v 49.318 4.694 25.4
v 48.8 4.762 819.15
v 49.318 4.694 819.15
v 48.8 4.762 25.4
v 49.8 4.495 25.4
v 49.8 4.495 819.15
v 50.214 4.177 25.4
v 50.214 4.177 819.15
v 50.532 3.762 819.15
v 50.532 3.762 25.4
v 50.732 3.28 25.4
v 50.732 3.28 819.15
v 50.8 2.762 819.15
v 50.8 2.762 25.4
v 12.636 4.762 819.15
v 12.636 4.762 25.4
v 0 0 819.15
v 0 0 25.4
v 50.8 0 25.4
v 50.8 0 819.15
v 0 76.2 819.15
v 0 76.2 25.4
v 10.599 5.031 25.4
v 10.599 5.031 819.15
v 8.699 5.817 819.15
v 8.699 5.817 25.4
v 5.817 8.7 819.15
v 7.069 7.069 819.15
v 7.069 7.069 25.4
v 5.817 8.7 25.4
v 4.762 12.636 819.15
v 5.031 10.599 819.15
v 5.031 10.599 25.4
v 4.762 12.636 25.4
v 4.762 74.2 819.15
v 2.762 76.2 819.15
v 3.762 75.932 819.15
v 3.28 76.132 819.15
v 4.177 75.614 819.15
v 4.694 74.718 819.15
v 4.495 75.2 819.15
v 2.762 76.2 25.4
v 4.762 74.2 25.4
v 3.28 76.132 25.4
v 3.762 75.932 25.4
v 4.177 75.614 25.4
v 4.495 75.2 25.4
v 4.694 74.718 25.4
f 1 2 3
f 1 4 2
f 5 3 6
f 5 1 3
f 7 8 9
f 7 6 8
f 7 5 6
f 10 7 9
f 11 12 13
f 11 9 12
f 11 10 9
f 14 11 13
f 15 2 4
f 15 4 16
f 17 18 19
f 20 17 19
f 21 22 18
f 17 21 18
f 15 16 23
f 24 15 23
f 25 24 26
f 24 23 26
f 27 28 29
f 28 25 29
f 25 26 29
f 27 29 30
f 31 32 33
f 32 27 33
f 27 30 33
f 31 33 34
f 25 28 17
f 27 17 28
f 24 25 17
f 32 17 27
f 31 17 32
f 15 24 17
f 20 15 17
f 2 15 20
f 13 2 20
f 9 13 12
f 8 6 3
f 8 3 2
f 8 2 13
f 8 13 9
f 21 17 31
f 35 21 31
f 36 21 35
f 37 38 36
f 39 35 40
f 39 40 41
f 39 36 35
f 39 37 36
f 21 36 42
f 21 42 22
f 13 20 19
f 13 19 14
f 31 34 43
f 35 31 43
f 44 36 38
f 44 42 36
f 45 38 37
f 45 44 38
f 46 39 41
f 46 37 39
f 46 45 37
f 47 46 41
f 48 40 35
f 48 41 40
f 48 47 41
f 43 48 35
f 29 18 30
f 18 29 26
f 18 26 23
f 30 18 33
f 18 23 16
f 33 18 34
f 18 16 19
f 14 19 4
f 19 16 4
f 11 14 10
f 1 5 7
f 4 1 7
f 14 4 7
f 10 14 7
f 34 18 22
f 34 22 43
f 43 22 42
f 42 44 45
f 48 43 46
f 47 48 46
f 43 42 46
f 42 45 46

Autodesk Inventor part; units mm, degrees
ref_plane "Start plane" through (0, 0, 25.4) normal (0, 0, 1) x (1, 0, 0)
ref_plane "End plane" through (0, 0, 819.15) normal (0, 0, 1) x (1, 0, 0)
sketch "Sketch" plane through (0, 0, 0) normal (0, 0, 1) x (1, 0, 0)
  line L0 (0, 76.2) -> (0, 0)
  line L1 (0, 0) -> (50.8, 0)
  line L2 (50.8, 0) -> (50.8, 2.7625)
  line L3 (48.8, 4.7625) -> (12.6365, 4.7625)
  line L4 (4.7625, 12.6365) -> (4.7625, 74.2)
  line L5 (2.7625, 76.2) -> (0, 76.2)
  line L6 (-7.0414, 0) -> (21.5385, 0) construction
  line L7 (0, -8.0414) -> (0, 34.5385) construction
  arc A0 (4.7625, 12.6365) -> (12.6365, 4.7625) centre (12.6365, 12.6365) ccw
  arc A1 (50.8, 2.7625) -> (48.8, 4.7625) centre (48.8, 2.7625) ccw
  arc A2 (4.7625, 74.2) -> (2.7625, 76.2) centre (2.7625, 74.2) ccw
  line L8 (0, 93.5453) -> (0, -24.9725) construction
  line L9 (-18.6925, 0) -> (62.8653, 0) construction
  point P0 (50.8, 4.7625)
  point P1 (4.7625, 4.7625)
  point P2 (4.7625, 76.2)
  dimension "d12" = 4.7625
  dimension "d13" = 76.2
  dimension "d14" = 50.8
  dimension "d15" = 0
  dimension "d16" = 4.7625
  dimension "d17" = 0
  dimension "d18" = 7.874
  dimension "d19" = 2
extrude "Body" add sketch "Sketch" along normal up to surface (793.75 mm away) from surface at 25.4
sketch "Sketch3" plane through (0, 0, 0) normal (0, 0, 1) x (1, 0, 0)
  line L0 (0, 0) -> (10, 0)
ref_plane "Work Plane5" through (0, 0, 0) normal (0, -1, 0) x (1, 0, 0)
sketch "Sketch4" plane through (0, 0, 0) normal (0, -1, 0) x (1, 0, 0)
  line L0 (-2, 25.4) -> (12, 25.4)
  line L1 (-2, 819.15) -> (12, 819.15)
  dimension "d23" = 793.75
ref_plane "Work Plane3" through (400.05, 0, 819.15) normal (0, 0, 1) x (1, 0, 0)
split "Split1" plane through (400.05, 0, 819.15) removes the side toward (0, 0, 1)
ref_plane "Work Plane4" through (-923.925, 0, 25.4) normal (0, 0, -1) x (-1, 0, 0)
split "Split2" plane through (-923.925, 0, 25.4) removes the side toward (0, 0, -1)
equation "\"d12\" = G_T"
equation "\"d13\" = G_H"
equation "\"d14\" = G_W"
equation "\"d16\" = G_T"
equation "\"d18\" = G_IR"
equation "\"d4\" = G_L"
equation "\"G_W\" = 50.8"
equation "\"G_H\" = 76.2"
equation "\"G_T\" = 4.7625"
equation "\"G_ER\" = 4.064"
equation "\"G_IR\" = 7.874"
equation "\"G_L\" = d23"
equation "\"ex\" = 0"
equation "\"ey\" = 0"
equation "\"G_OFFSET_START\" = -25.4"
equation "\"G_OFFSET_END\" = -25.4"
equation "\"d20\" = -G_OFFSET_START"
equation "\"d21\" = G_OFFSET_END + B_L"
equation "\"B_L\" = 844.55"
properties part number "ANSI L 3 x 2 x 3_16 00000005"
